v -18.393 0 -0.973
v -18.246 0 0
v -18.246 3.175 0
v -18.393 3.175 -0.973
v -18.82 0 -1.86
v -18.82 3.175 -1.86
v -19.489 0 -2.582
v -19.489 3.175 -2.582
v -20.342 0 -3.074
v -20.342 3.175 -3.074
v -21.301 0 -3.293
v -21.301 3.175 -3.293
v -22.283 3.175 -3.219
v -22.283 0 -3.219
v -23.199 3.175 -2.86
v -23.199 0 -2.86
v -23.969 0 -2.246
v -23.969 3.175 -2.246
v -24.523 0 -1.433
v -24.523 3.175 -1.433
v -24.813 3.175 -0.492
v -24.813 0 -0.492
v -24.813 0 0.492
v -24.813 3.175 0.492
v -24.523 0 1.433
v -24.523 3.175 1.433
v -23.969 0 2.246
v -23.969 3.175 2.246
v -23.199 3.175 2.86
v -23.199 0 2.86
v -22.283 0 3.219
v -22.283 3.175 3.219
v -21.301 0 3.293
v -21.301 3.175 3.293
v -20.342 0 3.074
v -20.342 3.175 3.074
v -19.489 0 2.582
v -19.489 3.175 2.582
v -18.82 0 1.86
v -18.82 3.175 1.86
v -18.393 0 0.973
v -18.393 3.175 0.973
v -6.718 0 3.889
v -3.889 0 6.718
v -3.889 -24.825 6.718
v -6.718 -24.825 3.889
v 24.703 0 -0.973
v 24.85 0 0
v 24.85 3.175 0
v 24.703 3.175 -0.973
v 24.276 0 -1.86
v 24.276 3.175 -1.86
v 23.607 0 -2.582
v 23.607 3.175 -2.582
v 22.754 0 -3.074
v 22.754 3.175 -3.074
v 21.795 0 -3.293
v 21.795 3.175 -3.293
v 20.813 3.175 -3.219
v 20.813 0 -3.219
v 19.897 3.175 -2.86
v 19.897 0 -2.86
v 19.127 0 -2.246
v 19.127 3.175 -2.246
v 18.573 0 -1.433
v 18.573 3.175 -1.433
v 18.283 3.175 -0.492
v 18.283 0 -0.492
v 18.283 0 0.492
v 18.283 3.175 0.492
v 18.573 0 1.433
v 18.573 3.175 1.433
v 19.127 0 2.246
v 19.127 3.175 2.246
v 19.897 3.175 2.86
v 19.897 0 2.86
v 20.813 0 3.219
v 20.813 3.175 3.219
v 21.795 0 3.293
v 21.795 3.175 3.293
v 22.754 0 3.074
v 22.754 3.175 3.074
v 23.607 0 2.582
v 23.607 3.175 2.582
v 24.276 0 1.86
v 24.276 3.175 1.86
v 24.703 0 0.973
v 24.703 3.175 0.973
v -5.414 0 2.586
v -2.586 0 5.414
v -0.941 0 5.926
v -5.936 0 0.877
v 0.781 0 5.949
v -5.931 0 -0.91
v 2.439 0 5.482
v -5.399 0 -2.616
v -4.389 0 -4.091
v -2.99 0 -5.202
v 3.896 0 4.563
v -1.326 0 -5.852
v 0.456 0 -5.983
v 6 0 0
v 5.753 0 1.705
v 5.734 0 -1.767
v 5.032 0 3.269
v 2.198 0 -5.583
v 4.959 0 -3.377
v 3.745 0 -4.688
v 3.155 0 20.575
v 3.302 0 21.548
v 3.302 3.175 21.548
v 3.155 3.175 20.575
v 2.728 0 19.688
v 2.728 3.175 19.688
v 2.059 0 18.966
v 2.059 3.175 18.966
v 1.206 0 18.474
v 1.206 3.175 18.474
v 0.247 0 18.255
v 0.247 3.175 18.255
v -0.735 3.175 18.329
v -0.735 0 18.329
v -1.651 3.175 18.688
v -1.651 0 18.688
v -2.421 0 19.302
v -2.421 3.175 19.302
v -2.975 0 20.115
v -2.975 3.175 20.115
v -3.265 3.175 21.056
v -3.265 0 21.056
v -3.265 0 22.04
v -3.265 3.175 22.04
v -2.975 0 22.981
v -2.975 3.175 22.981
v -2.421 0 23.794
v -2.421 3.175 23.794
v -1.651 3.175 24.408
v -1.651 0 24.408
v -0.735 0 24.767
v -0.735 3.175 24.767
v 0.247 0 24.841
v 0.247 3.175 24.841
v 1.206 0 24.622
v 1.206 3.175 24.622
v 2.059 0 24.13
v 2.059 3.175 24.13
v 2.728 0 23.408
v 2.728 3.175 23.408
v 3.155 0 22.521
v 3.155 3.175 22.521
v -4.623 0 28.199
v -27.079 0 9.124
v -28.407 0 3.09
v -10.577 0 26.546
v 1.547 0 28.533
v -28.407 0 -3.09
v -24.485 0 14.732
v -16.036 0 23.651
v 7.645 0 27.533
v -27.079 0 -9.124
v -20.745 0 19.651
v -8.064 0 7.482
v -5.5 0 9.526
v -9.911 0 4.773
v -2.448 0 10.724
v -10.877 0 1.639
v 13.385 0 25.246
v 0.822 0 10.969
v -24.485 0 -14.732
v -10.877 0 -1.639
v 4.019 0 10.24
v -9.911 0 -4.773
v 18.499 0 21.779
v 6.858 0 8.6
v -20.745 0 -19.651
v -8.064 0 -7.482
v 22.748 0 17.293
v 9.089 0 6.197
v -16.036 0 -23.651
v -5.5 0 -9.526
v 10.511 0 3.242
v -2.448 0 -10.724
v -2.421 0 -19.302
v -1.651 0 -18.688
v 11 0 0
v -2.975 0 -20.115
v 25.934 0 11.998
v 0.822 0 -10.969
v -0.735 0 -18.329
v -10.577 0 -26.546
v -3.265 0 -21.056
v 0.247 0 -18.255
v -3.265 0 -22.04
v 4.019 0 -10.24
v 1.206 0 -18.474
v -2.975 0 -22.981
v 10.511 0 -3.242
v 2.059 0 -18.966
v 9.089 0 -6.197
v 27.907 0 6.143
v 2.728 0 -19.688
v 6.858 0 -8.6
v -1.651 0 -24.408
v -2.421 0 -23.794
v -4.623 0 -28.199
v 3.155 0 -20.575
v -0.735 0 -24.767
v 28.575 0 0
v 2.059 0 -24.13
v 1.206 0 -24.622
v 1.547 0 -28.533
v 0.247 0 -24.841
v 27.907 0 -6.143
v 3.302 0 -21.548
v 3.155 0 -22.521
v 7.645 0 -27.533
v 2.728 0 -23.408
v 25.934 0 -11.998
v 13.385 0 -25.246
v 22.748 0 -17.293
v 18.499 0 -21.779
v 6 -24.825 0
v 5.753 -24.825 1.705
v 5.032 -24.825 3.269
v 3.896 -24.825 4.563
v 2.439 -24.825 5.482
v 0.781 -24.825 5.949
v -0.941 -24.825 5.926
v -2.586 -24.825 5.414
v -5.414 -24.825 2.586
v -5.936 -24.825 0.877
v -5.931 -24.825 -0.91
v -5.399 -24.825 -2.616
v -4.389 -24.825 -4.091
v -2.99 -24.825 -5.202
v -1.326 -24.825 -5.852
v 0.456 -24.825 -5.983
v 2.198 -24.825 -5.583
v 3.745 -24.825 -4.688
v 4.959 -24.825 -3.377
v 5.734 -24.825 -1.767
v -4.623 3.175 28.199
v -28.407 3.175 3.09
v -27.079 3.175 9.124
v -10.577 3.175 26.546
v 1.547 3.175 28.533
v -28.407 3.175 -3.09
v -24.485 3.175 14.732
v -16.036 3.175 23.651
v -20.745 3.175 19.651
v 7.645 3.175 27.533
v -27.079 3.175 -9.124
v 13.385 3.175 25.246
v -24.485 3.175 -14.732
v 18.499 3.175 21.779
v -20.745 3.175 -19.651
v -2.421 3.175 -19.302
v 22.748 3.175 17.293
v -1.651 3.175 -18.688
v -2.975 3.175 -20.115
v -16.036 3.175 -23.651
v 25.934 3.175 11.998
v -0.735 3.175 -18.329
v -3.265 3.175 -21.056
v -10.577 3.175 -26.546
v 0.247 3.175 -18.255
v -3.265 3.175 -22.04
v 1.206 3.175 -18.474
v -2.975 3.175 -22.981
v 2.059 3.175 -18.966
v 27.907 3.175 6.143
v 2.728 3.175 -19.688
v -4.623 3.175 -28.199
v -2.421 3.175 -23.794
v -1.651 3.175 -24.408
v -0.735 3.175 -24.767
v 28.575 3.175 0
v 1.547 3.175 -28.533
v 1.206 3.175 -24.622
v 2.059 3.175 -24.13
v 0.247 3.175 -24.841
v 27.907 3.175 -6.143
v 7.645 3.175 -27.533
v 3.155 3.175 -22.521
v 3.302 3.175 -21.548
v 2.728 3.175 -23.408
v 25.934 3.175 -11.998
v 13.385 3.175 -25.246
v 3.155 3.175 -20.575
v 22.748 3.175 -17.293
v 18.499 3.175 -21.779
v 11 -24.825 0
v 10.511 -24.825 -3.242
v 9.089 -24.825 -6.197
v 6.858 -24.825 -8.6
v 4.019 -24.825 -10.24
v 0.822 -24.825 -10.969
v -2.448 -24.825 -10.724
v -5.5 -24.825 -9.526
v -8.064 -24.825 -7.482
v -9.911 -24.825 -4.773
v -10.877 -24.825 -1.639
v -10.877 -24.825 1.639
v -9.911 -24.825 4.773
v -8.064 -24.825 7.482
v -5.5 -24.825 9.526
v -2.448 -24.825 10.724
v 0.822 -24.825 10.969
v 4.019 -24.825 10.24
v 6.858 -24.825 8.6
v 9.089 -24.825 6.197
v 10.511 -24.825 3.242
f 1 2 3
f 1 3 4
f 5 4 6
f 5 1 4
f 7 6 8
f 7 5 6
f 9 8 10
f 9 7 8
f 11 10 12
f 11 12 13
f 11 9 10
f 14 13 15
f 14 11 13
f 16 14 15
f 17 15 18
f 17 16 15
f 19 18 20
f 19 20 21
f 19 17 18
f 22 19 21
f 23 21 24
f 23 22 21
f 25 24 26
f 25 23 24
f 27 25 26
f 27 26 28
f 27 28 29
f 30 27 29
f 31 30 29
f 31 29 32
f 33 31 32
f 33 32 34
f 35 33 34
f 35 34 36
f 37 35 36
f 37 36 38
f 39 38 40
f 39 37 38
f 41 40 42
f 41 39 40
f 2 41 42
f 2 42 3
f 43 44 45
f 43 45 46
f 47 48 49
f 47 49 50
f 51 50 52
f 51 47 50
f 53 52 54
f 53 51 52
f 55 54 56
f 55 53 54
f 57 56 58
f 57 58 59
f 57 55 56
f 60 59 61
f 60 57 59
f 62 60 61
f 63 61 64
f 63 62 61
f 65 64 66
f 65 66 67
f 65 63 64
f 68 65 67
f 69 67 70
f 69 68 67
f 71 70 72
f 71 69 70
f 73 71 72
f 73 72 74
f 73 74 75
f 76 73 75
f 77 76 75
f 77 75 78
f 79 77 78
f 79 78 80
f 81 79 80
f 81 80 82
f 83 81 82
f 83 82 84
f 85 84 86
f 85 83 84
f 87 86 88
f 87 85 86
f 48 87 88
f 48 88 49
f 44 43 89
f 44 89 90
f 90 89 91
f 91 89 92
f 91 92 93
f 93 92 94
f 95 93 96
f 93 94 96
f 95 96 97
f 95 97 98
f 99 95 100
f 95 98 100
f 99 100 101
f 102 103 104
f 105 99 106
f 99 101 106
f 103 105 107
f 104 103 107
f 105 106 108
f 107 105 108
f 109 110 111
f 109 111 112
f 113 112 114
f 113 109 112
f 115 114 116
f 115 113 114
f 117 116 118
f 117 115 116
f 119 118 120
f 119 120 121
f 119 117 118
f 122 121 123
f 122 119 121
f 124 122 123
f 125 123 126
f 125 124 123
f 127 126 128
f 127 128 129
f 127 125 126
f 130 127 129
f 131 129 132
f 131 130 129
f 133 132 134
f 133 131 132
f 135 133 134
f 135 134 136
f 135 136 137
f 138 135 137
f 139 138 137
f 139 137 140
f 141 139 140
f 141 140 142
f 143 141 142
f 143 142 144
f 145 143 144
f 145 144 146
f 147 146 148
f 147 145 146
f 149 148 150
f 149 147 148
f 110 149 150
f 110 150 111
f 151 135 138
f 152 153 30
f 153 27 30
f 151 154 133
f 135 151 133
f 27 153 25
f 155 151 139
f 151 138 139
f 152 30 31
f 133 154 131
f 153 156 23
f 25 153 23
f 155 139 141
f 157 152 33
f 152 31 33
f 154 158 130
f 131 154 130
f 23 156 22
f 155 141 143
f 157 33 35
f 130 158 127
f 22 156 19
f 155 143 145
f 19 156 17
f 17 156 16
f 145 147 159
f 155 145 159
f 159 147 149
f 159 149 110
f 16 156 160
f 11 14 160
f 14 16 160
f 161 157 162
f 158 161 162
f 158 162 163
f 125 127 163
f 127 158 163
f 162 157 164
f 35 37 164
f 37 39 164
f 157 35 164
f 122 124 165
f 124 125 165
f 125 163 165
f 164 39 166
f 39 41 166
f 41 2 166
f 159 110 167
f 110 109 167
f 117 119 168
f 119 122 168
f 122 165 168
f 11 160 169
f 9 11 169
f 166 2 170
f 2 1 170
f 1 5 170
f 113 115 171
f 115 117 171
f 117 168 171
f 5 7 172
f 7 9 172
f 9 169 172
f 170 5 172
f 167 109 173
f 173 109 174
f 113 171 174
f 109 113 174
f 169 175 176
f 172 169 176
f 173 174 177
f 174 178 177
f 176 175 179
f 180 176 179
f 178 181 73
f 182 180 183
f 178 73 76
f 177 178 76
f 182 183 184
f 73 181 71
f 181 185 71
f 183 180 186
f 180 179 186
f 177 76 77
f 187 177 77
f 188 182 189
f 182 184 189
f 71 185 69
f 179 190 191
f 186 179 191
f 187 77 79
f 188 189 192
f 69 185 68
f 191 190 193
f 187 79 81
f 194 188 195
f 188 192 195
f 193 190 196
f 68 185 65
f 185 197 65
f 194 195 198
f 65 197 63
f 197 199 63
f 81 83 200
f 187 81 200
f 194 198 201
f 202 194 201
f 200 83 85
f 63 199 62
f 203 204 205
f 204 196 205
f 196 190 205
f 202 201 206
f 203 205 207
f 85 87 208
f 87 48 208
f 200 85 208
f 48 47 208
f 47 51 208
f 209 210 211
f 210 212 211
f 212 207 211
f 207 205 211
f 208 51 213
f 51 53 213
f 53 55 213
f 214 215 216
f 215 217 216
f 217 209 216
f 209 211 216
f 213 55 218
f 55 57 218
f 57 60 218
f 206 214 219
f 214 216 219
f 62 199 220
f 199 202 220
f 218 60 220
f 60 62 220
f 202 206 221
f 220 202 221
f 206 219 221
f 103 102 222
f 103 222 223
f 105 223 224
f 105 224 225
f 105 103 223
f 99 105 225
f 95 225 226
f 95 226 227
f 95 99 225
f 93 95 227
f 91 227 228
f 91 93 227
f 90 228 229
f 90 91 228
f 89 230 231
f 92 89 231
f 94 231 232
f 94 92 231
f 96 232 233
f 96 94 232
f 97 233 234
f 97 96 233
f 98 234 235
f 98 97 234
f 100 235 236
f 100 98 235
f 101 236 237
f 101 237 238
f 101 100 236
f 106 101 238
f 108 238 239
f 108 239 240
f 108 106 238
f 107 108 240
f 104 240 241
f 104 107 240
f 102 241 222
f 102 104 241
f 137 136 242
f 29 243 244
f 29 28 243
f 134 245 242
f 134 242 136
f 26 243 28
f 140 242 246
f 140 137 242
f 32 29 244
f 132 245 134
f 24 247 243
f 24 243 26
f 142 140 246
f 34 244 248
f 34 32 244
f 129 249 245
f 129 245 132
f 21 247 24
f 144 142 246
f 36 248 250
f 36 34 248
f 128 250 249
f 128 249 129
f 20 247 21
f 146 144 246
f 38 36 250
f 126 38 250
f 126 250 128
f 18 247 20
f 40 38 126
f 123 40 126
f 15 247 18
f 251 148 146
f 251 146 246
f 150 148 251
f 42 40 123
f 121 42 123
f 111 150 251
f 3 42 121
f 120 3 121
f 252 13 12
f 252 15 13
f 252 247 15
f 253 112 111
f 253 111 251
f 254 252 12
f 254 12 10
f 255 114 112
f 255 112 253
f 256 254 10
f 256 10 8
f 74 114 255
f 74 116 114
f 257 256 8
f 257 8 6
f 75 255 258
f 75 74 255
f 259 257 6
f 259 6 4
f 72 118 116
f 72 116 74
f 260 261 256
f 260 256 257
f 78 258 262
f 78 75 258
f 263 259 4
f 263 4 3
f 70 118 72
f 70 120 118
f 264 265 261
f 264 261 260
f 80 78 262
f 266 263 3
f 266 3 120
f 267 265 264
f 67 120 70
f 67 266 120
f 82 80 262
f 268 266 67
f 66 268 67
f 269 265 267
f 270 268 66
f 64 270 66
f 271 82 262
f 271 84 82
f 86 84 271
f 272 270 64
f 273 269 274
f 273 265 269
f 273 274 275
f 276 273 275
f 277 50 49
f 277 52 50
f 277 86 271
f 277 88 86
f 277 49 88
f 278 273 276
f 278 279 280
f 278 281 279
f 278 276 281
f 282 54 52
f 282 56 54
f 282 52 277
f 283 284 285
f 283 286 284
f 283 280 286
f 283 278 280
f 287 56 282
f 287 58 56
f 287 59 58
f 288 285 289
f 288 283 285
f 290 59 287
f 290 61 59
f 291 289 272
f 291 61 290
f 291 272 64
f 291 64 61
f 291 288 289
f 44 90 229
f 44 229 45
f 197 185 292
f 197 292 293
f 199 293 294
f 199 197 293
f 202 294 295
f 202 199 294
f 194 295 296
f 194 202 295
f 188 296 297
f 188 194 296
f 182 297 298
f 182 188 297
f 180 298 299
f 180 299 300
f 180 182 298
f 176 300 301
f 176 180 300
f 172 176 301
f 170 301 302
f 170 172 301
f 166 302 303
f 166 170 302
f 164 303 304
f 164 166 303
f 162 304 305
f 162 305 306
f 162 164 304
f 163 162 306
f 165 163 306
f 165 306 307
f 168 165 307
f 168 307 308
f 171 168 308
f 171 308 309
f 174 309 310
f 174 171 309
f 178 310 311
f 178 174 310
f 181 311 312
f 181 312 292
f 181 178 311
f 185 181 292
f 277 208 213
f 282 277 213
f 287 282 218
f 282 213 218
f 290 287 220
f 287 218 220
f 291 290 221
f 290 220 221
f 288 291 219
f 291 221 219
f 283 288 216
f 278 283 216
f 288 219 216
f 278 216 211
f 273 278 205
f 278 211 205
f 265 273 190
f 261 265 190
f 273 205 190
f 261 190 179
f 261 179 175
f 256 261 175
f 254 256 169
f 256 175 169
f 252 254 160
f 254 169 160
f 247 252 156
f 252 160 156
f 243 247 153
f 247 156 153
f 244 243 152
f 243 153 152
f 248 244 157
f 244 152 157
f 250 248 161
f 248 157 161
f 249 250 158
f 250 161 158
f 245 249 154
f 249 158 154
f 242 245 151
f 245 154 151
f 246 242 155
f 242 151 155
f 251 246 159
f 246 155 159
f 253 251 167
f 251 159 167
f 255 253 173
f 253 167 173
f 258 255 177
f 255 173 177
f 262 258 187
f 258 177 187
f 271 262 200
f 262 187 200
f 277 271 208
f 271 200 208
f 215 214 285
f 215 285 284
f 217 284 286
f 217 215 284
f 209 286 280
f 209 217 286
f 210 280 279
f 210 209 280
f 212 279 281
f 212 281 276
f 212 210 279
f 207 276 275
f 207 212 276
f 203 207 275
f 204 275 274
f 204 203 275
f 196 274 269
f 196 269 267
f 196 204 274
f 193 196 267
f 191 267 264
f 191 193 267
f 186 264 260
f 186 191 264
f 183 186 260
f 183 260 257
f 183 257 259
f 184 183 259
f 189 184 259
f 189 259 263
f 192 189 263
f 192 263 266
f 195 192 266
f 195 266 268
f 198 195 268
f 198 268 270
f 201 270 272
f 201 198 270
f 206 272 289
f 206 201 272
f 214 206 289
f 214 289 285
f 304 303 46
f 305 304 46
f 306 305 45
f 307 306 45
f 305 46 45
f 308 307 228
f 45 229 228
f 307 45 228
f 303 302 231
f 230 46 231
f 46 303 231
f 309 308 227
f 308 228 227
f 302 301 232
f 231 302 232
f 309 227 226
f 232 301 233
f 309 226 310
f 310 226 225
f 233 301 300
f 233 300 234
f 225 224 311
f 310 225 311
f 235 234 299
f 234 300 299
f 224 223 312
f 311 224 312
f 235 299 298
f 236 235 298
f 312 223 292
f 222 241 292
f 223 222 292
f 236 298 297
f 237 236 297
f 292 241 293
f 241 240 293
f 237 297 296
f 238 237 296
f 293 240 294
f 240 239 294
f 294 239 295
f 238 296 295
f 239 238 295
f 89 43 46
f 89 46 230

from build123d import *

# Parameters (mm, degrees)
SKETCH1_R           = 28.575
SKETCH1_R_2         = 3.302
SKETCH1_R_3         = 11
BOSS_EXTRUDE1_DEPTH = 3.175
SKETCH1_4_R         = 11
BOSS_EXTRUDE2_DEPTH = 3.175
SKETCH1_5_R         = 11
BOSS_EXTRUDE3_DEPTH = 24.825


with BuildPart() as part:
    # Sketch1 → Boss-Extrude1 (new body)
    with BuildSketch(Plane(origin=(0, 0, 0), x_dir=(1, 0, 0), z_dir=(0, 1, 0))):
        Circle(SKETCH1_R)
        with Locations((0, -21.548)):
            Circle(SKETCH1_R_2, mode=Mode.SUBTRACT)
        with Locations((-21.548, 0)):
            Circle(SKETCH1_R_2, mode=Mode.SUBTRACT)
        Circle(SKETCH1_R_3, mode=Mode.SUBTRACT)
        with BuildLine():
            ThreePointArc((24.85, 0), (21.548, -3.302), (18.246, 0))
            ThreePointArc((18.246, 0), (21.548, 3.302), (24.85, 0))
        make_face(mode=Mode.SUBTRACT)
        with Locations((0, 21.548)):
            Circle(SKETCH1_R_2, mode=Mode.SUBTRACT)
    extrude(amount=BOSS_EXTRUDE1_DEPTH)

    # Sketch1<4> → Boss-Extrude2 (add)
    with BuildSketch(Plane(origin=(0, 0, 0), x_dir=(1, 0, 0), z_dir=(0, 1, 0))):
        Circle(SKETCH1_4_R)
    extrude(amount=BOSS_EXTRUDE2_DEPTH)

    # Sketch1<5> → Boss-Extrude3 (add)
    with BuildSketch(Plane(origin=(0, 0, 0), x_dir=(1, 0, 0), z_dir=(0, 1, 0))):
        Circle(SKETCH1_5_R)
        with BuildLine():
            ThreePointArc((-5.414213562, -2.585786438), (-1.325654296, 5.851721173), (6, 0))
            ThreePointArc((6, 0), (3.200412581, -5.075170865), (-2.585786438, -5.414213562))
            Line((-2.585786438, -5.414213562), (-3.889087297, -6.717514421))
            Line((-3.889087297, -6.717514421), (-6.717514421, -3.889087297))
            Line((-6.717514421, -3.889087297), (-5.414213562, -2.585786438))
        make_face(mode=Mode.SUBTRACT)
    extrude(amount=-BOSS_EXTRUDE3_DEPTH)


solid = part.part
